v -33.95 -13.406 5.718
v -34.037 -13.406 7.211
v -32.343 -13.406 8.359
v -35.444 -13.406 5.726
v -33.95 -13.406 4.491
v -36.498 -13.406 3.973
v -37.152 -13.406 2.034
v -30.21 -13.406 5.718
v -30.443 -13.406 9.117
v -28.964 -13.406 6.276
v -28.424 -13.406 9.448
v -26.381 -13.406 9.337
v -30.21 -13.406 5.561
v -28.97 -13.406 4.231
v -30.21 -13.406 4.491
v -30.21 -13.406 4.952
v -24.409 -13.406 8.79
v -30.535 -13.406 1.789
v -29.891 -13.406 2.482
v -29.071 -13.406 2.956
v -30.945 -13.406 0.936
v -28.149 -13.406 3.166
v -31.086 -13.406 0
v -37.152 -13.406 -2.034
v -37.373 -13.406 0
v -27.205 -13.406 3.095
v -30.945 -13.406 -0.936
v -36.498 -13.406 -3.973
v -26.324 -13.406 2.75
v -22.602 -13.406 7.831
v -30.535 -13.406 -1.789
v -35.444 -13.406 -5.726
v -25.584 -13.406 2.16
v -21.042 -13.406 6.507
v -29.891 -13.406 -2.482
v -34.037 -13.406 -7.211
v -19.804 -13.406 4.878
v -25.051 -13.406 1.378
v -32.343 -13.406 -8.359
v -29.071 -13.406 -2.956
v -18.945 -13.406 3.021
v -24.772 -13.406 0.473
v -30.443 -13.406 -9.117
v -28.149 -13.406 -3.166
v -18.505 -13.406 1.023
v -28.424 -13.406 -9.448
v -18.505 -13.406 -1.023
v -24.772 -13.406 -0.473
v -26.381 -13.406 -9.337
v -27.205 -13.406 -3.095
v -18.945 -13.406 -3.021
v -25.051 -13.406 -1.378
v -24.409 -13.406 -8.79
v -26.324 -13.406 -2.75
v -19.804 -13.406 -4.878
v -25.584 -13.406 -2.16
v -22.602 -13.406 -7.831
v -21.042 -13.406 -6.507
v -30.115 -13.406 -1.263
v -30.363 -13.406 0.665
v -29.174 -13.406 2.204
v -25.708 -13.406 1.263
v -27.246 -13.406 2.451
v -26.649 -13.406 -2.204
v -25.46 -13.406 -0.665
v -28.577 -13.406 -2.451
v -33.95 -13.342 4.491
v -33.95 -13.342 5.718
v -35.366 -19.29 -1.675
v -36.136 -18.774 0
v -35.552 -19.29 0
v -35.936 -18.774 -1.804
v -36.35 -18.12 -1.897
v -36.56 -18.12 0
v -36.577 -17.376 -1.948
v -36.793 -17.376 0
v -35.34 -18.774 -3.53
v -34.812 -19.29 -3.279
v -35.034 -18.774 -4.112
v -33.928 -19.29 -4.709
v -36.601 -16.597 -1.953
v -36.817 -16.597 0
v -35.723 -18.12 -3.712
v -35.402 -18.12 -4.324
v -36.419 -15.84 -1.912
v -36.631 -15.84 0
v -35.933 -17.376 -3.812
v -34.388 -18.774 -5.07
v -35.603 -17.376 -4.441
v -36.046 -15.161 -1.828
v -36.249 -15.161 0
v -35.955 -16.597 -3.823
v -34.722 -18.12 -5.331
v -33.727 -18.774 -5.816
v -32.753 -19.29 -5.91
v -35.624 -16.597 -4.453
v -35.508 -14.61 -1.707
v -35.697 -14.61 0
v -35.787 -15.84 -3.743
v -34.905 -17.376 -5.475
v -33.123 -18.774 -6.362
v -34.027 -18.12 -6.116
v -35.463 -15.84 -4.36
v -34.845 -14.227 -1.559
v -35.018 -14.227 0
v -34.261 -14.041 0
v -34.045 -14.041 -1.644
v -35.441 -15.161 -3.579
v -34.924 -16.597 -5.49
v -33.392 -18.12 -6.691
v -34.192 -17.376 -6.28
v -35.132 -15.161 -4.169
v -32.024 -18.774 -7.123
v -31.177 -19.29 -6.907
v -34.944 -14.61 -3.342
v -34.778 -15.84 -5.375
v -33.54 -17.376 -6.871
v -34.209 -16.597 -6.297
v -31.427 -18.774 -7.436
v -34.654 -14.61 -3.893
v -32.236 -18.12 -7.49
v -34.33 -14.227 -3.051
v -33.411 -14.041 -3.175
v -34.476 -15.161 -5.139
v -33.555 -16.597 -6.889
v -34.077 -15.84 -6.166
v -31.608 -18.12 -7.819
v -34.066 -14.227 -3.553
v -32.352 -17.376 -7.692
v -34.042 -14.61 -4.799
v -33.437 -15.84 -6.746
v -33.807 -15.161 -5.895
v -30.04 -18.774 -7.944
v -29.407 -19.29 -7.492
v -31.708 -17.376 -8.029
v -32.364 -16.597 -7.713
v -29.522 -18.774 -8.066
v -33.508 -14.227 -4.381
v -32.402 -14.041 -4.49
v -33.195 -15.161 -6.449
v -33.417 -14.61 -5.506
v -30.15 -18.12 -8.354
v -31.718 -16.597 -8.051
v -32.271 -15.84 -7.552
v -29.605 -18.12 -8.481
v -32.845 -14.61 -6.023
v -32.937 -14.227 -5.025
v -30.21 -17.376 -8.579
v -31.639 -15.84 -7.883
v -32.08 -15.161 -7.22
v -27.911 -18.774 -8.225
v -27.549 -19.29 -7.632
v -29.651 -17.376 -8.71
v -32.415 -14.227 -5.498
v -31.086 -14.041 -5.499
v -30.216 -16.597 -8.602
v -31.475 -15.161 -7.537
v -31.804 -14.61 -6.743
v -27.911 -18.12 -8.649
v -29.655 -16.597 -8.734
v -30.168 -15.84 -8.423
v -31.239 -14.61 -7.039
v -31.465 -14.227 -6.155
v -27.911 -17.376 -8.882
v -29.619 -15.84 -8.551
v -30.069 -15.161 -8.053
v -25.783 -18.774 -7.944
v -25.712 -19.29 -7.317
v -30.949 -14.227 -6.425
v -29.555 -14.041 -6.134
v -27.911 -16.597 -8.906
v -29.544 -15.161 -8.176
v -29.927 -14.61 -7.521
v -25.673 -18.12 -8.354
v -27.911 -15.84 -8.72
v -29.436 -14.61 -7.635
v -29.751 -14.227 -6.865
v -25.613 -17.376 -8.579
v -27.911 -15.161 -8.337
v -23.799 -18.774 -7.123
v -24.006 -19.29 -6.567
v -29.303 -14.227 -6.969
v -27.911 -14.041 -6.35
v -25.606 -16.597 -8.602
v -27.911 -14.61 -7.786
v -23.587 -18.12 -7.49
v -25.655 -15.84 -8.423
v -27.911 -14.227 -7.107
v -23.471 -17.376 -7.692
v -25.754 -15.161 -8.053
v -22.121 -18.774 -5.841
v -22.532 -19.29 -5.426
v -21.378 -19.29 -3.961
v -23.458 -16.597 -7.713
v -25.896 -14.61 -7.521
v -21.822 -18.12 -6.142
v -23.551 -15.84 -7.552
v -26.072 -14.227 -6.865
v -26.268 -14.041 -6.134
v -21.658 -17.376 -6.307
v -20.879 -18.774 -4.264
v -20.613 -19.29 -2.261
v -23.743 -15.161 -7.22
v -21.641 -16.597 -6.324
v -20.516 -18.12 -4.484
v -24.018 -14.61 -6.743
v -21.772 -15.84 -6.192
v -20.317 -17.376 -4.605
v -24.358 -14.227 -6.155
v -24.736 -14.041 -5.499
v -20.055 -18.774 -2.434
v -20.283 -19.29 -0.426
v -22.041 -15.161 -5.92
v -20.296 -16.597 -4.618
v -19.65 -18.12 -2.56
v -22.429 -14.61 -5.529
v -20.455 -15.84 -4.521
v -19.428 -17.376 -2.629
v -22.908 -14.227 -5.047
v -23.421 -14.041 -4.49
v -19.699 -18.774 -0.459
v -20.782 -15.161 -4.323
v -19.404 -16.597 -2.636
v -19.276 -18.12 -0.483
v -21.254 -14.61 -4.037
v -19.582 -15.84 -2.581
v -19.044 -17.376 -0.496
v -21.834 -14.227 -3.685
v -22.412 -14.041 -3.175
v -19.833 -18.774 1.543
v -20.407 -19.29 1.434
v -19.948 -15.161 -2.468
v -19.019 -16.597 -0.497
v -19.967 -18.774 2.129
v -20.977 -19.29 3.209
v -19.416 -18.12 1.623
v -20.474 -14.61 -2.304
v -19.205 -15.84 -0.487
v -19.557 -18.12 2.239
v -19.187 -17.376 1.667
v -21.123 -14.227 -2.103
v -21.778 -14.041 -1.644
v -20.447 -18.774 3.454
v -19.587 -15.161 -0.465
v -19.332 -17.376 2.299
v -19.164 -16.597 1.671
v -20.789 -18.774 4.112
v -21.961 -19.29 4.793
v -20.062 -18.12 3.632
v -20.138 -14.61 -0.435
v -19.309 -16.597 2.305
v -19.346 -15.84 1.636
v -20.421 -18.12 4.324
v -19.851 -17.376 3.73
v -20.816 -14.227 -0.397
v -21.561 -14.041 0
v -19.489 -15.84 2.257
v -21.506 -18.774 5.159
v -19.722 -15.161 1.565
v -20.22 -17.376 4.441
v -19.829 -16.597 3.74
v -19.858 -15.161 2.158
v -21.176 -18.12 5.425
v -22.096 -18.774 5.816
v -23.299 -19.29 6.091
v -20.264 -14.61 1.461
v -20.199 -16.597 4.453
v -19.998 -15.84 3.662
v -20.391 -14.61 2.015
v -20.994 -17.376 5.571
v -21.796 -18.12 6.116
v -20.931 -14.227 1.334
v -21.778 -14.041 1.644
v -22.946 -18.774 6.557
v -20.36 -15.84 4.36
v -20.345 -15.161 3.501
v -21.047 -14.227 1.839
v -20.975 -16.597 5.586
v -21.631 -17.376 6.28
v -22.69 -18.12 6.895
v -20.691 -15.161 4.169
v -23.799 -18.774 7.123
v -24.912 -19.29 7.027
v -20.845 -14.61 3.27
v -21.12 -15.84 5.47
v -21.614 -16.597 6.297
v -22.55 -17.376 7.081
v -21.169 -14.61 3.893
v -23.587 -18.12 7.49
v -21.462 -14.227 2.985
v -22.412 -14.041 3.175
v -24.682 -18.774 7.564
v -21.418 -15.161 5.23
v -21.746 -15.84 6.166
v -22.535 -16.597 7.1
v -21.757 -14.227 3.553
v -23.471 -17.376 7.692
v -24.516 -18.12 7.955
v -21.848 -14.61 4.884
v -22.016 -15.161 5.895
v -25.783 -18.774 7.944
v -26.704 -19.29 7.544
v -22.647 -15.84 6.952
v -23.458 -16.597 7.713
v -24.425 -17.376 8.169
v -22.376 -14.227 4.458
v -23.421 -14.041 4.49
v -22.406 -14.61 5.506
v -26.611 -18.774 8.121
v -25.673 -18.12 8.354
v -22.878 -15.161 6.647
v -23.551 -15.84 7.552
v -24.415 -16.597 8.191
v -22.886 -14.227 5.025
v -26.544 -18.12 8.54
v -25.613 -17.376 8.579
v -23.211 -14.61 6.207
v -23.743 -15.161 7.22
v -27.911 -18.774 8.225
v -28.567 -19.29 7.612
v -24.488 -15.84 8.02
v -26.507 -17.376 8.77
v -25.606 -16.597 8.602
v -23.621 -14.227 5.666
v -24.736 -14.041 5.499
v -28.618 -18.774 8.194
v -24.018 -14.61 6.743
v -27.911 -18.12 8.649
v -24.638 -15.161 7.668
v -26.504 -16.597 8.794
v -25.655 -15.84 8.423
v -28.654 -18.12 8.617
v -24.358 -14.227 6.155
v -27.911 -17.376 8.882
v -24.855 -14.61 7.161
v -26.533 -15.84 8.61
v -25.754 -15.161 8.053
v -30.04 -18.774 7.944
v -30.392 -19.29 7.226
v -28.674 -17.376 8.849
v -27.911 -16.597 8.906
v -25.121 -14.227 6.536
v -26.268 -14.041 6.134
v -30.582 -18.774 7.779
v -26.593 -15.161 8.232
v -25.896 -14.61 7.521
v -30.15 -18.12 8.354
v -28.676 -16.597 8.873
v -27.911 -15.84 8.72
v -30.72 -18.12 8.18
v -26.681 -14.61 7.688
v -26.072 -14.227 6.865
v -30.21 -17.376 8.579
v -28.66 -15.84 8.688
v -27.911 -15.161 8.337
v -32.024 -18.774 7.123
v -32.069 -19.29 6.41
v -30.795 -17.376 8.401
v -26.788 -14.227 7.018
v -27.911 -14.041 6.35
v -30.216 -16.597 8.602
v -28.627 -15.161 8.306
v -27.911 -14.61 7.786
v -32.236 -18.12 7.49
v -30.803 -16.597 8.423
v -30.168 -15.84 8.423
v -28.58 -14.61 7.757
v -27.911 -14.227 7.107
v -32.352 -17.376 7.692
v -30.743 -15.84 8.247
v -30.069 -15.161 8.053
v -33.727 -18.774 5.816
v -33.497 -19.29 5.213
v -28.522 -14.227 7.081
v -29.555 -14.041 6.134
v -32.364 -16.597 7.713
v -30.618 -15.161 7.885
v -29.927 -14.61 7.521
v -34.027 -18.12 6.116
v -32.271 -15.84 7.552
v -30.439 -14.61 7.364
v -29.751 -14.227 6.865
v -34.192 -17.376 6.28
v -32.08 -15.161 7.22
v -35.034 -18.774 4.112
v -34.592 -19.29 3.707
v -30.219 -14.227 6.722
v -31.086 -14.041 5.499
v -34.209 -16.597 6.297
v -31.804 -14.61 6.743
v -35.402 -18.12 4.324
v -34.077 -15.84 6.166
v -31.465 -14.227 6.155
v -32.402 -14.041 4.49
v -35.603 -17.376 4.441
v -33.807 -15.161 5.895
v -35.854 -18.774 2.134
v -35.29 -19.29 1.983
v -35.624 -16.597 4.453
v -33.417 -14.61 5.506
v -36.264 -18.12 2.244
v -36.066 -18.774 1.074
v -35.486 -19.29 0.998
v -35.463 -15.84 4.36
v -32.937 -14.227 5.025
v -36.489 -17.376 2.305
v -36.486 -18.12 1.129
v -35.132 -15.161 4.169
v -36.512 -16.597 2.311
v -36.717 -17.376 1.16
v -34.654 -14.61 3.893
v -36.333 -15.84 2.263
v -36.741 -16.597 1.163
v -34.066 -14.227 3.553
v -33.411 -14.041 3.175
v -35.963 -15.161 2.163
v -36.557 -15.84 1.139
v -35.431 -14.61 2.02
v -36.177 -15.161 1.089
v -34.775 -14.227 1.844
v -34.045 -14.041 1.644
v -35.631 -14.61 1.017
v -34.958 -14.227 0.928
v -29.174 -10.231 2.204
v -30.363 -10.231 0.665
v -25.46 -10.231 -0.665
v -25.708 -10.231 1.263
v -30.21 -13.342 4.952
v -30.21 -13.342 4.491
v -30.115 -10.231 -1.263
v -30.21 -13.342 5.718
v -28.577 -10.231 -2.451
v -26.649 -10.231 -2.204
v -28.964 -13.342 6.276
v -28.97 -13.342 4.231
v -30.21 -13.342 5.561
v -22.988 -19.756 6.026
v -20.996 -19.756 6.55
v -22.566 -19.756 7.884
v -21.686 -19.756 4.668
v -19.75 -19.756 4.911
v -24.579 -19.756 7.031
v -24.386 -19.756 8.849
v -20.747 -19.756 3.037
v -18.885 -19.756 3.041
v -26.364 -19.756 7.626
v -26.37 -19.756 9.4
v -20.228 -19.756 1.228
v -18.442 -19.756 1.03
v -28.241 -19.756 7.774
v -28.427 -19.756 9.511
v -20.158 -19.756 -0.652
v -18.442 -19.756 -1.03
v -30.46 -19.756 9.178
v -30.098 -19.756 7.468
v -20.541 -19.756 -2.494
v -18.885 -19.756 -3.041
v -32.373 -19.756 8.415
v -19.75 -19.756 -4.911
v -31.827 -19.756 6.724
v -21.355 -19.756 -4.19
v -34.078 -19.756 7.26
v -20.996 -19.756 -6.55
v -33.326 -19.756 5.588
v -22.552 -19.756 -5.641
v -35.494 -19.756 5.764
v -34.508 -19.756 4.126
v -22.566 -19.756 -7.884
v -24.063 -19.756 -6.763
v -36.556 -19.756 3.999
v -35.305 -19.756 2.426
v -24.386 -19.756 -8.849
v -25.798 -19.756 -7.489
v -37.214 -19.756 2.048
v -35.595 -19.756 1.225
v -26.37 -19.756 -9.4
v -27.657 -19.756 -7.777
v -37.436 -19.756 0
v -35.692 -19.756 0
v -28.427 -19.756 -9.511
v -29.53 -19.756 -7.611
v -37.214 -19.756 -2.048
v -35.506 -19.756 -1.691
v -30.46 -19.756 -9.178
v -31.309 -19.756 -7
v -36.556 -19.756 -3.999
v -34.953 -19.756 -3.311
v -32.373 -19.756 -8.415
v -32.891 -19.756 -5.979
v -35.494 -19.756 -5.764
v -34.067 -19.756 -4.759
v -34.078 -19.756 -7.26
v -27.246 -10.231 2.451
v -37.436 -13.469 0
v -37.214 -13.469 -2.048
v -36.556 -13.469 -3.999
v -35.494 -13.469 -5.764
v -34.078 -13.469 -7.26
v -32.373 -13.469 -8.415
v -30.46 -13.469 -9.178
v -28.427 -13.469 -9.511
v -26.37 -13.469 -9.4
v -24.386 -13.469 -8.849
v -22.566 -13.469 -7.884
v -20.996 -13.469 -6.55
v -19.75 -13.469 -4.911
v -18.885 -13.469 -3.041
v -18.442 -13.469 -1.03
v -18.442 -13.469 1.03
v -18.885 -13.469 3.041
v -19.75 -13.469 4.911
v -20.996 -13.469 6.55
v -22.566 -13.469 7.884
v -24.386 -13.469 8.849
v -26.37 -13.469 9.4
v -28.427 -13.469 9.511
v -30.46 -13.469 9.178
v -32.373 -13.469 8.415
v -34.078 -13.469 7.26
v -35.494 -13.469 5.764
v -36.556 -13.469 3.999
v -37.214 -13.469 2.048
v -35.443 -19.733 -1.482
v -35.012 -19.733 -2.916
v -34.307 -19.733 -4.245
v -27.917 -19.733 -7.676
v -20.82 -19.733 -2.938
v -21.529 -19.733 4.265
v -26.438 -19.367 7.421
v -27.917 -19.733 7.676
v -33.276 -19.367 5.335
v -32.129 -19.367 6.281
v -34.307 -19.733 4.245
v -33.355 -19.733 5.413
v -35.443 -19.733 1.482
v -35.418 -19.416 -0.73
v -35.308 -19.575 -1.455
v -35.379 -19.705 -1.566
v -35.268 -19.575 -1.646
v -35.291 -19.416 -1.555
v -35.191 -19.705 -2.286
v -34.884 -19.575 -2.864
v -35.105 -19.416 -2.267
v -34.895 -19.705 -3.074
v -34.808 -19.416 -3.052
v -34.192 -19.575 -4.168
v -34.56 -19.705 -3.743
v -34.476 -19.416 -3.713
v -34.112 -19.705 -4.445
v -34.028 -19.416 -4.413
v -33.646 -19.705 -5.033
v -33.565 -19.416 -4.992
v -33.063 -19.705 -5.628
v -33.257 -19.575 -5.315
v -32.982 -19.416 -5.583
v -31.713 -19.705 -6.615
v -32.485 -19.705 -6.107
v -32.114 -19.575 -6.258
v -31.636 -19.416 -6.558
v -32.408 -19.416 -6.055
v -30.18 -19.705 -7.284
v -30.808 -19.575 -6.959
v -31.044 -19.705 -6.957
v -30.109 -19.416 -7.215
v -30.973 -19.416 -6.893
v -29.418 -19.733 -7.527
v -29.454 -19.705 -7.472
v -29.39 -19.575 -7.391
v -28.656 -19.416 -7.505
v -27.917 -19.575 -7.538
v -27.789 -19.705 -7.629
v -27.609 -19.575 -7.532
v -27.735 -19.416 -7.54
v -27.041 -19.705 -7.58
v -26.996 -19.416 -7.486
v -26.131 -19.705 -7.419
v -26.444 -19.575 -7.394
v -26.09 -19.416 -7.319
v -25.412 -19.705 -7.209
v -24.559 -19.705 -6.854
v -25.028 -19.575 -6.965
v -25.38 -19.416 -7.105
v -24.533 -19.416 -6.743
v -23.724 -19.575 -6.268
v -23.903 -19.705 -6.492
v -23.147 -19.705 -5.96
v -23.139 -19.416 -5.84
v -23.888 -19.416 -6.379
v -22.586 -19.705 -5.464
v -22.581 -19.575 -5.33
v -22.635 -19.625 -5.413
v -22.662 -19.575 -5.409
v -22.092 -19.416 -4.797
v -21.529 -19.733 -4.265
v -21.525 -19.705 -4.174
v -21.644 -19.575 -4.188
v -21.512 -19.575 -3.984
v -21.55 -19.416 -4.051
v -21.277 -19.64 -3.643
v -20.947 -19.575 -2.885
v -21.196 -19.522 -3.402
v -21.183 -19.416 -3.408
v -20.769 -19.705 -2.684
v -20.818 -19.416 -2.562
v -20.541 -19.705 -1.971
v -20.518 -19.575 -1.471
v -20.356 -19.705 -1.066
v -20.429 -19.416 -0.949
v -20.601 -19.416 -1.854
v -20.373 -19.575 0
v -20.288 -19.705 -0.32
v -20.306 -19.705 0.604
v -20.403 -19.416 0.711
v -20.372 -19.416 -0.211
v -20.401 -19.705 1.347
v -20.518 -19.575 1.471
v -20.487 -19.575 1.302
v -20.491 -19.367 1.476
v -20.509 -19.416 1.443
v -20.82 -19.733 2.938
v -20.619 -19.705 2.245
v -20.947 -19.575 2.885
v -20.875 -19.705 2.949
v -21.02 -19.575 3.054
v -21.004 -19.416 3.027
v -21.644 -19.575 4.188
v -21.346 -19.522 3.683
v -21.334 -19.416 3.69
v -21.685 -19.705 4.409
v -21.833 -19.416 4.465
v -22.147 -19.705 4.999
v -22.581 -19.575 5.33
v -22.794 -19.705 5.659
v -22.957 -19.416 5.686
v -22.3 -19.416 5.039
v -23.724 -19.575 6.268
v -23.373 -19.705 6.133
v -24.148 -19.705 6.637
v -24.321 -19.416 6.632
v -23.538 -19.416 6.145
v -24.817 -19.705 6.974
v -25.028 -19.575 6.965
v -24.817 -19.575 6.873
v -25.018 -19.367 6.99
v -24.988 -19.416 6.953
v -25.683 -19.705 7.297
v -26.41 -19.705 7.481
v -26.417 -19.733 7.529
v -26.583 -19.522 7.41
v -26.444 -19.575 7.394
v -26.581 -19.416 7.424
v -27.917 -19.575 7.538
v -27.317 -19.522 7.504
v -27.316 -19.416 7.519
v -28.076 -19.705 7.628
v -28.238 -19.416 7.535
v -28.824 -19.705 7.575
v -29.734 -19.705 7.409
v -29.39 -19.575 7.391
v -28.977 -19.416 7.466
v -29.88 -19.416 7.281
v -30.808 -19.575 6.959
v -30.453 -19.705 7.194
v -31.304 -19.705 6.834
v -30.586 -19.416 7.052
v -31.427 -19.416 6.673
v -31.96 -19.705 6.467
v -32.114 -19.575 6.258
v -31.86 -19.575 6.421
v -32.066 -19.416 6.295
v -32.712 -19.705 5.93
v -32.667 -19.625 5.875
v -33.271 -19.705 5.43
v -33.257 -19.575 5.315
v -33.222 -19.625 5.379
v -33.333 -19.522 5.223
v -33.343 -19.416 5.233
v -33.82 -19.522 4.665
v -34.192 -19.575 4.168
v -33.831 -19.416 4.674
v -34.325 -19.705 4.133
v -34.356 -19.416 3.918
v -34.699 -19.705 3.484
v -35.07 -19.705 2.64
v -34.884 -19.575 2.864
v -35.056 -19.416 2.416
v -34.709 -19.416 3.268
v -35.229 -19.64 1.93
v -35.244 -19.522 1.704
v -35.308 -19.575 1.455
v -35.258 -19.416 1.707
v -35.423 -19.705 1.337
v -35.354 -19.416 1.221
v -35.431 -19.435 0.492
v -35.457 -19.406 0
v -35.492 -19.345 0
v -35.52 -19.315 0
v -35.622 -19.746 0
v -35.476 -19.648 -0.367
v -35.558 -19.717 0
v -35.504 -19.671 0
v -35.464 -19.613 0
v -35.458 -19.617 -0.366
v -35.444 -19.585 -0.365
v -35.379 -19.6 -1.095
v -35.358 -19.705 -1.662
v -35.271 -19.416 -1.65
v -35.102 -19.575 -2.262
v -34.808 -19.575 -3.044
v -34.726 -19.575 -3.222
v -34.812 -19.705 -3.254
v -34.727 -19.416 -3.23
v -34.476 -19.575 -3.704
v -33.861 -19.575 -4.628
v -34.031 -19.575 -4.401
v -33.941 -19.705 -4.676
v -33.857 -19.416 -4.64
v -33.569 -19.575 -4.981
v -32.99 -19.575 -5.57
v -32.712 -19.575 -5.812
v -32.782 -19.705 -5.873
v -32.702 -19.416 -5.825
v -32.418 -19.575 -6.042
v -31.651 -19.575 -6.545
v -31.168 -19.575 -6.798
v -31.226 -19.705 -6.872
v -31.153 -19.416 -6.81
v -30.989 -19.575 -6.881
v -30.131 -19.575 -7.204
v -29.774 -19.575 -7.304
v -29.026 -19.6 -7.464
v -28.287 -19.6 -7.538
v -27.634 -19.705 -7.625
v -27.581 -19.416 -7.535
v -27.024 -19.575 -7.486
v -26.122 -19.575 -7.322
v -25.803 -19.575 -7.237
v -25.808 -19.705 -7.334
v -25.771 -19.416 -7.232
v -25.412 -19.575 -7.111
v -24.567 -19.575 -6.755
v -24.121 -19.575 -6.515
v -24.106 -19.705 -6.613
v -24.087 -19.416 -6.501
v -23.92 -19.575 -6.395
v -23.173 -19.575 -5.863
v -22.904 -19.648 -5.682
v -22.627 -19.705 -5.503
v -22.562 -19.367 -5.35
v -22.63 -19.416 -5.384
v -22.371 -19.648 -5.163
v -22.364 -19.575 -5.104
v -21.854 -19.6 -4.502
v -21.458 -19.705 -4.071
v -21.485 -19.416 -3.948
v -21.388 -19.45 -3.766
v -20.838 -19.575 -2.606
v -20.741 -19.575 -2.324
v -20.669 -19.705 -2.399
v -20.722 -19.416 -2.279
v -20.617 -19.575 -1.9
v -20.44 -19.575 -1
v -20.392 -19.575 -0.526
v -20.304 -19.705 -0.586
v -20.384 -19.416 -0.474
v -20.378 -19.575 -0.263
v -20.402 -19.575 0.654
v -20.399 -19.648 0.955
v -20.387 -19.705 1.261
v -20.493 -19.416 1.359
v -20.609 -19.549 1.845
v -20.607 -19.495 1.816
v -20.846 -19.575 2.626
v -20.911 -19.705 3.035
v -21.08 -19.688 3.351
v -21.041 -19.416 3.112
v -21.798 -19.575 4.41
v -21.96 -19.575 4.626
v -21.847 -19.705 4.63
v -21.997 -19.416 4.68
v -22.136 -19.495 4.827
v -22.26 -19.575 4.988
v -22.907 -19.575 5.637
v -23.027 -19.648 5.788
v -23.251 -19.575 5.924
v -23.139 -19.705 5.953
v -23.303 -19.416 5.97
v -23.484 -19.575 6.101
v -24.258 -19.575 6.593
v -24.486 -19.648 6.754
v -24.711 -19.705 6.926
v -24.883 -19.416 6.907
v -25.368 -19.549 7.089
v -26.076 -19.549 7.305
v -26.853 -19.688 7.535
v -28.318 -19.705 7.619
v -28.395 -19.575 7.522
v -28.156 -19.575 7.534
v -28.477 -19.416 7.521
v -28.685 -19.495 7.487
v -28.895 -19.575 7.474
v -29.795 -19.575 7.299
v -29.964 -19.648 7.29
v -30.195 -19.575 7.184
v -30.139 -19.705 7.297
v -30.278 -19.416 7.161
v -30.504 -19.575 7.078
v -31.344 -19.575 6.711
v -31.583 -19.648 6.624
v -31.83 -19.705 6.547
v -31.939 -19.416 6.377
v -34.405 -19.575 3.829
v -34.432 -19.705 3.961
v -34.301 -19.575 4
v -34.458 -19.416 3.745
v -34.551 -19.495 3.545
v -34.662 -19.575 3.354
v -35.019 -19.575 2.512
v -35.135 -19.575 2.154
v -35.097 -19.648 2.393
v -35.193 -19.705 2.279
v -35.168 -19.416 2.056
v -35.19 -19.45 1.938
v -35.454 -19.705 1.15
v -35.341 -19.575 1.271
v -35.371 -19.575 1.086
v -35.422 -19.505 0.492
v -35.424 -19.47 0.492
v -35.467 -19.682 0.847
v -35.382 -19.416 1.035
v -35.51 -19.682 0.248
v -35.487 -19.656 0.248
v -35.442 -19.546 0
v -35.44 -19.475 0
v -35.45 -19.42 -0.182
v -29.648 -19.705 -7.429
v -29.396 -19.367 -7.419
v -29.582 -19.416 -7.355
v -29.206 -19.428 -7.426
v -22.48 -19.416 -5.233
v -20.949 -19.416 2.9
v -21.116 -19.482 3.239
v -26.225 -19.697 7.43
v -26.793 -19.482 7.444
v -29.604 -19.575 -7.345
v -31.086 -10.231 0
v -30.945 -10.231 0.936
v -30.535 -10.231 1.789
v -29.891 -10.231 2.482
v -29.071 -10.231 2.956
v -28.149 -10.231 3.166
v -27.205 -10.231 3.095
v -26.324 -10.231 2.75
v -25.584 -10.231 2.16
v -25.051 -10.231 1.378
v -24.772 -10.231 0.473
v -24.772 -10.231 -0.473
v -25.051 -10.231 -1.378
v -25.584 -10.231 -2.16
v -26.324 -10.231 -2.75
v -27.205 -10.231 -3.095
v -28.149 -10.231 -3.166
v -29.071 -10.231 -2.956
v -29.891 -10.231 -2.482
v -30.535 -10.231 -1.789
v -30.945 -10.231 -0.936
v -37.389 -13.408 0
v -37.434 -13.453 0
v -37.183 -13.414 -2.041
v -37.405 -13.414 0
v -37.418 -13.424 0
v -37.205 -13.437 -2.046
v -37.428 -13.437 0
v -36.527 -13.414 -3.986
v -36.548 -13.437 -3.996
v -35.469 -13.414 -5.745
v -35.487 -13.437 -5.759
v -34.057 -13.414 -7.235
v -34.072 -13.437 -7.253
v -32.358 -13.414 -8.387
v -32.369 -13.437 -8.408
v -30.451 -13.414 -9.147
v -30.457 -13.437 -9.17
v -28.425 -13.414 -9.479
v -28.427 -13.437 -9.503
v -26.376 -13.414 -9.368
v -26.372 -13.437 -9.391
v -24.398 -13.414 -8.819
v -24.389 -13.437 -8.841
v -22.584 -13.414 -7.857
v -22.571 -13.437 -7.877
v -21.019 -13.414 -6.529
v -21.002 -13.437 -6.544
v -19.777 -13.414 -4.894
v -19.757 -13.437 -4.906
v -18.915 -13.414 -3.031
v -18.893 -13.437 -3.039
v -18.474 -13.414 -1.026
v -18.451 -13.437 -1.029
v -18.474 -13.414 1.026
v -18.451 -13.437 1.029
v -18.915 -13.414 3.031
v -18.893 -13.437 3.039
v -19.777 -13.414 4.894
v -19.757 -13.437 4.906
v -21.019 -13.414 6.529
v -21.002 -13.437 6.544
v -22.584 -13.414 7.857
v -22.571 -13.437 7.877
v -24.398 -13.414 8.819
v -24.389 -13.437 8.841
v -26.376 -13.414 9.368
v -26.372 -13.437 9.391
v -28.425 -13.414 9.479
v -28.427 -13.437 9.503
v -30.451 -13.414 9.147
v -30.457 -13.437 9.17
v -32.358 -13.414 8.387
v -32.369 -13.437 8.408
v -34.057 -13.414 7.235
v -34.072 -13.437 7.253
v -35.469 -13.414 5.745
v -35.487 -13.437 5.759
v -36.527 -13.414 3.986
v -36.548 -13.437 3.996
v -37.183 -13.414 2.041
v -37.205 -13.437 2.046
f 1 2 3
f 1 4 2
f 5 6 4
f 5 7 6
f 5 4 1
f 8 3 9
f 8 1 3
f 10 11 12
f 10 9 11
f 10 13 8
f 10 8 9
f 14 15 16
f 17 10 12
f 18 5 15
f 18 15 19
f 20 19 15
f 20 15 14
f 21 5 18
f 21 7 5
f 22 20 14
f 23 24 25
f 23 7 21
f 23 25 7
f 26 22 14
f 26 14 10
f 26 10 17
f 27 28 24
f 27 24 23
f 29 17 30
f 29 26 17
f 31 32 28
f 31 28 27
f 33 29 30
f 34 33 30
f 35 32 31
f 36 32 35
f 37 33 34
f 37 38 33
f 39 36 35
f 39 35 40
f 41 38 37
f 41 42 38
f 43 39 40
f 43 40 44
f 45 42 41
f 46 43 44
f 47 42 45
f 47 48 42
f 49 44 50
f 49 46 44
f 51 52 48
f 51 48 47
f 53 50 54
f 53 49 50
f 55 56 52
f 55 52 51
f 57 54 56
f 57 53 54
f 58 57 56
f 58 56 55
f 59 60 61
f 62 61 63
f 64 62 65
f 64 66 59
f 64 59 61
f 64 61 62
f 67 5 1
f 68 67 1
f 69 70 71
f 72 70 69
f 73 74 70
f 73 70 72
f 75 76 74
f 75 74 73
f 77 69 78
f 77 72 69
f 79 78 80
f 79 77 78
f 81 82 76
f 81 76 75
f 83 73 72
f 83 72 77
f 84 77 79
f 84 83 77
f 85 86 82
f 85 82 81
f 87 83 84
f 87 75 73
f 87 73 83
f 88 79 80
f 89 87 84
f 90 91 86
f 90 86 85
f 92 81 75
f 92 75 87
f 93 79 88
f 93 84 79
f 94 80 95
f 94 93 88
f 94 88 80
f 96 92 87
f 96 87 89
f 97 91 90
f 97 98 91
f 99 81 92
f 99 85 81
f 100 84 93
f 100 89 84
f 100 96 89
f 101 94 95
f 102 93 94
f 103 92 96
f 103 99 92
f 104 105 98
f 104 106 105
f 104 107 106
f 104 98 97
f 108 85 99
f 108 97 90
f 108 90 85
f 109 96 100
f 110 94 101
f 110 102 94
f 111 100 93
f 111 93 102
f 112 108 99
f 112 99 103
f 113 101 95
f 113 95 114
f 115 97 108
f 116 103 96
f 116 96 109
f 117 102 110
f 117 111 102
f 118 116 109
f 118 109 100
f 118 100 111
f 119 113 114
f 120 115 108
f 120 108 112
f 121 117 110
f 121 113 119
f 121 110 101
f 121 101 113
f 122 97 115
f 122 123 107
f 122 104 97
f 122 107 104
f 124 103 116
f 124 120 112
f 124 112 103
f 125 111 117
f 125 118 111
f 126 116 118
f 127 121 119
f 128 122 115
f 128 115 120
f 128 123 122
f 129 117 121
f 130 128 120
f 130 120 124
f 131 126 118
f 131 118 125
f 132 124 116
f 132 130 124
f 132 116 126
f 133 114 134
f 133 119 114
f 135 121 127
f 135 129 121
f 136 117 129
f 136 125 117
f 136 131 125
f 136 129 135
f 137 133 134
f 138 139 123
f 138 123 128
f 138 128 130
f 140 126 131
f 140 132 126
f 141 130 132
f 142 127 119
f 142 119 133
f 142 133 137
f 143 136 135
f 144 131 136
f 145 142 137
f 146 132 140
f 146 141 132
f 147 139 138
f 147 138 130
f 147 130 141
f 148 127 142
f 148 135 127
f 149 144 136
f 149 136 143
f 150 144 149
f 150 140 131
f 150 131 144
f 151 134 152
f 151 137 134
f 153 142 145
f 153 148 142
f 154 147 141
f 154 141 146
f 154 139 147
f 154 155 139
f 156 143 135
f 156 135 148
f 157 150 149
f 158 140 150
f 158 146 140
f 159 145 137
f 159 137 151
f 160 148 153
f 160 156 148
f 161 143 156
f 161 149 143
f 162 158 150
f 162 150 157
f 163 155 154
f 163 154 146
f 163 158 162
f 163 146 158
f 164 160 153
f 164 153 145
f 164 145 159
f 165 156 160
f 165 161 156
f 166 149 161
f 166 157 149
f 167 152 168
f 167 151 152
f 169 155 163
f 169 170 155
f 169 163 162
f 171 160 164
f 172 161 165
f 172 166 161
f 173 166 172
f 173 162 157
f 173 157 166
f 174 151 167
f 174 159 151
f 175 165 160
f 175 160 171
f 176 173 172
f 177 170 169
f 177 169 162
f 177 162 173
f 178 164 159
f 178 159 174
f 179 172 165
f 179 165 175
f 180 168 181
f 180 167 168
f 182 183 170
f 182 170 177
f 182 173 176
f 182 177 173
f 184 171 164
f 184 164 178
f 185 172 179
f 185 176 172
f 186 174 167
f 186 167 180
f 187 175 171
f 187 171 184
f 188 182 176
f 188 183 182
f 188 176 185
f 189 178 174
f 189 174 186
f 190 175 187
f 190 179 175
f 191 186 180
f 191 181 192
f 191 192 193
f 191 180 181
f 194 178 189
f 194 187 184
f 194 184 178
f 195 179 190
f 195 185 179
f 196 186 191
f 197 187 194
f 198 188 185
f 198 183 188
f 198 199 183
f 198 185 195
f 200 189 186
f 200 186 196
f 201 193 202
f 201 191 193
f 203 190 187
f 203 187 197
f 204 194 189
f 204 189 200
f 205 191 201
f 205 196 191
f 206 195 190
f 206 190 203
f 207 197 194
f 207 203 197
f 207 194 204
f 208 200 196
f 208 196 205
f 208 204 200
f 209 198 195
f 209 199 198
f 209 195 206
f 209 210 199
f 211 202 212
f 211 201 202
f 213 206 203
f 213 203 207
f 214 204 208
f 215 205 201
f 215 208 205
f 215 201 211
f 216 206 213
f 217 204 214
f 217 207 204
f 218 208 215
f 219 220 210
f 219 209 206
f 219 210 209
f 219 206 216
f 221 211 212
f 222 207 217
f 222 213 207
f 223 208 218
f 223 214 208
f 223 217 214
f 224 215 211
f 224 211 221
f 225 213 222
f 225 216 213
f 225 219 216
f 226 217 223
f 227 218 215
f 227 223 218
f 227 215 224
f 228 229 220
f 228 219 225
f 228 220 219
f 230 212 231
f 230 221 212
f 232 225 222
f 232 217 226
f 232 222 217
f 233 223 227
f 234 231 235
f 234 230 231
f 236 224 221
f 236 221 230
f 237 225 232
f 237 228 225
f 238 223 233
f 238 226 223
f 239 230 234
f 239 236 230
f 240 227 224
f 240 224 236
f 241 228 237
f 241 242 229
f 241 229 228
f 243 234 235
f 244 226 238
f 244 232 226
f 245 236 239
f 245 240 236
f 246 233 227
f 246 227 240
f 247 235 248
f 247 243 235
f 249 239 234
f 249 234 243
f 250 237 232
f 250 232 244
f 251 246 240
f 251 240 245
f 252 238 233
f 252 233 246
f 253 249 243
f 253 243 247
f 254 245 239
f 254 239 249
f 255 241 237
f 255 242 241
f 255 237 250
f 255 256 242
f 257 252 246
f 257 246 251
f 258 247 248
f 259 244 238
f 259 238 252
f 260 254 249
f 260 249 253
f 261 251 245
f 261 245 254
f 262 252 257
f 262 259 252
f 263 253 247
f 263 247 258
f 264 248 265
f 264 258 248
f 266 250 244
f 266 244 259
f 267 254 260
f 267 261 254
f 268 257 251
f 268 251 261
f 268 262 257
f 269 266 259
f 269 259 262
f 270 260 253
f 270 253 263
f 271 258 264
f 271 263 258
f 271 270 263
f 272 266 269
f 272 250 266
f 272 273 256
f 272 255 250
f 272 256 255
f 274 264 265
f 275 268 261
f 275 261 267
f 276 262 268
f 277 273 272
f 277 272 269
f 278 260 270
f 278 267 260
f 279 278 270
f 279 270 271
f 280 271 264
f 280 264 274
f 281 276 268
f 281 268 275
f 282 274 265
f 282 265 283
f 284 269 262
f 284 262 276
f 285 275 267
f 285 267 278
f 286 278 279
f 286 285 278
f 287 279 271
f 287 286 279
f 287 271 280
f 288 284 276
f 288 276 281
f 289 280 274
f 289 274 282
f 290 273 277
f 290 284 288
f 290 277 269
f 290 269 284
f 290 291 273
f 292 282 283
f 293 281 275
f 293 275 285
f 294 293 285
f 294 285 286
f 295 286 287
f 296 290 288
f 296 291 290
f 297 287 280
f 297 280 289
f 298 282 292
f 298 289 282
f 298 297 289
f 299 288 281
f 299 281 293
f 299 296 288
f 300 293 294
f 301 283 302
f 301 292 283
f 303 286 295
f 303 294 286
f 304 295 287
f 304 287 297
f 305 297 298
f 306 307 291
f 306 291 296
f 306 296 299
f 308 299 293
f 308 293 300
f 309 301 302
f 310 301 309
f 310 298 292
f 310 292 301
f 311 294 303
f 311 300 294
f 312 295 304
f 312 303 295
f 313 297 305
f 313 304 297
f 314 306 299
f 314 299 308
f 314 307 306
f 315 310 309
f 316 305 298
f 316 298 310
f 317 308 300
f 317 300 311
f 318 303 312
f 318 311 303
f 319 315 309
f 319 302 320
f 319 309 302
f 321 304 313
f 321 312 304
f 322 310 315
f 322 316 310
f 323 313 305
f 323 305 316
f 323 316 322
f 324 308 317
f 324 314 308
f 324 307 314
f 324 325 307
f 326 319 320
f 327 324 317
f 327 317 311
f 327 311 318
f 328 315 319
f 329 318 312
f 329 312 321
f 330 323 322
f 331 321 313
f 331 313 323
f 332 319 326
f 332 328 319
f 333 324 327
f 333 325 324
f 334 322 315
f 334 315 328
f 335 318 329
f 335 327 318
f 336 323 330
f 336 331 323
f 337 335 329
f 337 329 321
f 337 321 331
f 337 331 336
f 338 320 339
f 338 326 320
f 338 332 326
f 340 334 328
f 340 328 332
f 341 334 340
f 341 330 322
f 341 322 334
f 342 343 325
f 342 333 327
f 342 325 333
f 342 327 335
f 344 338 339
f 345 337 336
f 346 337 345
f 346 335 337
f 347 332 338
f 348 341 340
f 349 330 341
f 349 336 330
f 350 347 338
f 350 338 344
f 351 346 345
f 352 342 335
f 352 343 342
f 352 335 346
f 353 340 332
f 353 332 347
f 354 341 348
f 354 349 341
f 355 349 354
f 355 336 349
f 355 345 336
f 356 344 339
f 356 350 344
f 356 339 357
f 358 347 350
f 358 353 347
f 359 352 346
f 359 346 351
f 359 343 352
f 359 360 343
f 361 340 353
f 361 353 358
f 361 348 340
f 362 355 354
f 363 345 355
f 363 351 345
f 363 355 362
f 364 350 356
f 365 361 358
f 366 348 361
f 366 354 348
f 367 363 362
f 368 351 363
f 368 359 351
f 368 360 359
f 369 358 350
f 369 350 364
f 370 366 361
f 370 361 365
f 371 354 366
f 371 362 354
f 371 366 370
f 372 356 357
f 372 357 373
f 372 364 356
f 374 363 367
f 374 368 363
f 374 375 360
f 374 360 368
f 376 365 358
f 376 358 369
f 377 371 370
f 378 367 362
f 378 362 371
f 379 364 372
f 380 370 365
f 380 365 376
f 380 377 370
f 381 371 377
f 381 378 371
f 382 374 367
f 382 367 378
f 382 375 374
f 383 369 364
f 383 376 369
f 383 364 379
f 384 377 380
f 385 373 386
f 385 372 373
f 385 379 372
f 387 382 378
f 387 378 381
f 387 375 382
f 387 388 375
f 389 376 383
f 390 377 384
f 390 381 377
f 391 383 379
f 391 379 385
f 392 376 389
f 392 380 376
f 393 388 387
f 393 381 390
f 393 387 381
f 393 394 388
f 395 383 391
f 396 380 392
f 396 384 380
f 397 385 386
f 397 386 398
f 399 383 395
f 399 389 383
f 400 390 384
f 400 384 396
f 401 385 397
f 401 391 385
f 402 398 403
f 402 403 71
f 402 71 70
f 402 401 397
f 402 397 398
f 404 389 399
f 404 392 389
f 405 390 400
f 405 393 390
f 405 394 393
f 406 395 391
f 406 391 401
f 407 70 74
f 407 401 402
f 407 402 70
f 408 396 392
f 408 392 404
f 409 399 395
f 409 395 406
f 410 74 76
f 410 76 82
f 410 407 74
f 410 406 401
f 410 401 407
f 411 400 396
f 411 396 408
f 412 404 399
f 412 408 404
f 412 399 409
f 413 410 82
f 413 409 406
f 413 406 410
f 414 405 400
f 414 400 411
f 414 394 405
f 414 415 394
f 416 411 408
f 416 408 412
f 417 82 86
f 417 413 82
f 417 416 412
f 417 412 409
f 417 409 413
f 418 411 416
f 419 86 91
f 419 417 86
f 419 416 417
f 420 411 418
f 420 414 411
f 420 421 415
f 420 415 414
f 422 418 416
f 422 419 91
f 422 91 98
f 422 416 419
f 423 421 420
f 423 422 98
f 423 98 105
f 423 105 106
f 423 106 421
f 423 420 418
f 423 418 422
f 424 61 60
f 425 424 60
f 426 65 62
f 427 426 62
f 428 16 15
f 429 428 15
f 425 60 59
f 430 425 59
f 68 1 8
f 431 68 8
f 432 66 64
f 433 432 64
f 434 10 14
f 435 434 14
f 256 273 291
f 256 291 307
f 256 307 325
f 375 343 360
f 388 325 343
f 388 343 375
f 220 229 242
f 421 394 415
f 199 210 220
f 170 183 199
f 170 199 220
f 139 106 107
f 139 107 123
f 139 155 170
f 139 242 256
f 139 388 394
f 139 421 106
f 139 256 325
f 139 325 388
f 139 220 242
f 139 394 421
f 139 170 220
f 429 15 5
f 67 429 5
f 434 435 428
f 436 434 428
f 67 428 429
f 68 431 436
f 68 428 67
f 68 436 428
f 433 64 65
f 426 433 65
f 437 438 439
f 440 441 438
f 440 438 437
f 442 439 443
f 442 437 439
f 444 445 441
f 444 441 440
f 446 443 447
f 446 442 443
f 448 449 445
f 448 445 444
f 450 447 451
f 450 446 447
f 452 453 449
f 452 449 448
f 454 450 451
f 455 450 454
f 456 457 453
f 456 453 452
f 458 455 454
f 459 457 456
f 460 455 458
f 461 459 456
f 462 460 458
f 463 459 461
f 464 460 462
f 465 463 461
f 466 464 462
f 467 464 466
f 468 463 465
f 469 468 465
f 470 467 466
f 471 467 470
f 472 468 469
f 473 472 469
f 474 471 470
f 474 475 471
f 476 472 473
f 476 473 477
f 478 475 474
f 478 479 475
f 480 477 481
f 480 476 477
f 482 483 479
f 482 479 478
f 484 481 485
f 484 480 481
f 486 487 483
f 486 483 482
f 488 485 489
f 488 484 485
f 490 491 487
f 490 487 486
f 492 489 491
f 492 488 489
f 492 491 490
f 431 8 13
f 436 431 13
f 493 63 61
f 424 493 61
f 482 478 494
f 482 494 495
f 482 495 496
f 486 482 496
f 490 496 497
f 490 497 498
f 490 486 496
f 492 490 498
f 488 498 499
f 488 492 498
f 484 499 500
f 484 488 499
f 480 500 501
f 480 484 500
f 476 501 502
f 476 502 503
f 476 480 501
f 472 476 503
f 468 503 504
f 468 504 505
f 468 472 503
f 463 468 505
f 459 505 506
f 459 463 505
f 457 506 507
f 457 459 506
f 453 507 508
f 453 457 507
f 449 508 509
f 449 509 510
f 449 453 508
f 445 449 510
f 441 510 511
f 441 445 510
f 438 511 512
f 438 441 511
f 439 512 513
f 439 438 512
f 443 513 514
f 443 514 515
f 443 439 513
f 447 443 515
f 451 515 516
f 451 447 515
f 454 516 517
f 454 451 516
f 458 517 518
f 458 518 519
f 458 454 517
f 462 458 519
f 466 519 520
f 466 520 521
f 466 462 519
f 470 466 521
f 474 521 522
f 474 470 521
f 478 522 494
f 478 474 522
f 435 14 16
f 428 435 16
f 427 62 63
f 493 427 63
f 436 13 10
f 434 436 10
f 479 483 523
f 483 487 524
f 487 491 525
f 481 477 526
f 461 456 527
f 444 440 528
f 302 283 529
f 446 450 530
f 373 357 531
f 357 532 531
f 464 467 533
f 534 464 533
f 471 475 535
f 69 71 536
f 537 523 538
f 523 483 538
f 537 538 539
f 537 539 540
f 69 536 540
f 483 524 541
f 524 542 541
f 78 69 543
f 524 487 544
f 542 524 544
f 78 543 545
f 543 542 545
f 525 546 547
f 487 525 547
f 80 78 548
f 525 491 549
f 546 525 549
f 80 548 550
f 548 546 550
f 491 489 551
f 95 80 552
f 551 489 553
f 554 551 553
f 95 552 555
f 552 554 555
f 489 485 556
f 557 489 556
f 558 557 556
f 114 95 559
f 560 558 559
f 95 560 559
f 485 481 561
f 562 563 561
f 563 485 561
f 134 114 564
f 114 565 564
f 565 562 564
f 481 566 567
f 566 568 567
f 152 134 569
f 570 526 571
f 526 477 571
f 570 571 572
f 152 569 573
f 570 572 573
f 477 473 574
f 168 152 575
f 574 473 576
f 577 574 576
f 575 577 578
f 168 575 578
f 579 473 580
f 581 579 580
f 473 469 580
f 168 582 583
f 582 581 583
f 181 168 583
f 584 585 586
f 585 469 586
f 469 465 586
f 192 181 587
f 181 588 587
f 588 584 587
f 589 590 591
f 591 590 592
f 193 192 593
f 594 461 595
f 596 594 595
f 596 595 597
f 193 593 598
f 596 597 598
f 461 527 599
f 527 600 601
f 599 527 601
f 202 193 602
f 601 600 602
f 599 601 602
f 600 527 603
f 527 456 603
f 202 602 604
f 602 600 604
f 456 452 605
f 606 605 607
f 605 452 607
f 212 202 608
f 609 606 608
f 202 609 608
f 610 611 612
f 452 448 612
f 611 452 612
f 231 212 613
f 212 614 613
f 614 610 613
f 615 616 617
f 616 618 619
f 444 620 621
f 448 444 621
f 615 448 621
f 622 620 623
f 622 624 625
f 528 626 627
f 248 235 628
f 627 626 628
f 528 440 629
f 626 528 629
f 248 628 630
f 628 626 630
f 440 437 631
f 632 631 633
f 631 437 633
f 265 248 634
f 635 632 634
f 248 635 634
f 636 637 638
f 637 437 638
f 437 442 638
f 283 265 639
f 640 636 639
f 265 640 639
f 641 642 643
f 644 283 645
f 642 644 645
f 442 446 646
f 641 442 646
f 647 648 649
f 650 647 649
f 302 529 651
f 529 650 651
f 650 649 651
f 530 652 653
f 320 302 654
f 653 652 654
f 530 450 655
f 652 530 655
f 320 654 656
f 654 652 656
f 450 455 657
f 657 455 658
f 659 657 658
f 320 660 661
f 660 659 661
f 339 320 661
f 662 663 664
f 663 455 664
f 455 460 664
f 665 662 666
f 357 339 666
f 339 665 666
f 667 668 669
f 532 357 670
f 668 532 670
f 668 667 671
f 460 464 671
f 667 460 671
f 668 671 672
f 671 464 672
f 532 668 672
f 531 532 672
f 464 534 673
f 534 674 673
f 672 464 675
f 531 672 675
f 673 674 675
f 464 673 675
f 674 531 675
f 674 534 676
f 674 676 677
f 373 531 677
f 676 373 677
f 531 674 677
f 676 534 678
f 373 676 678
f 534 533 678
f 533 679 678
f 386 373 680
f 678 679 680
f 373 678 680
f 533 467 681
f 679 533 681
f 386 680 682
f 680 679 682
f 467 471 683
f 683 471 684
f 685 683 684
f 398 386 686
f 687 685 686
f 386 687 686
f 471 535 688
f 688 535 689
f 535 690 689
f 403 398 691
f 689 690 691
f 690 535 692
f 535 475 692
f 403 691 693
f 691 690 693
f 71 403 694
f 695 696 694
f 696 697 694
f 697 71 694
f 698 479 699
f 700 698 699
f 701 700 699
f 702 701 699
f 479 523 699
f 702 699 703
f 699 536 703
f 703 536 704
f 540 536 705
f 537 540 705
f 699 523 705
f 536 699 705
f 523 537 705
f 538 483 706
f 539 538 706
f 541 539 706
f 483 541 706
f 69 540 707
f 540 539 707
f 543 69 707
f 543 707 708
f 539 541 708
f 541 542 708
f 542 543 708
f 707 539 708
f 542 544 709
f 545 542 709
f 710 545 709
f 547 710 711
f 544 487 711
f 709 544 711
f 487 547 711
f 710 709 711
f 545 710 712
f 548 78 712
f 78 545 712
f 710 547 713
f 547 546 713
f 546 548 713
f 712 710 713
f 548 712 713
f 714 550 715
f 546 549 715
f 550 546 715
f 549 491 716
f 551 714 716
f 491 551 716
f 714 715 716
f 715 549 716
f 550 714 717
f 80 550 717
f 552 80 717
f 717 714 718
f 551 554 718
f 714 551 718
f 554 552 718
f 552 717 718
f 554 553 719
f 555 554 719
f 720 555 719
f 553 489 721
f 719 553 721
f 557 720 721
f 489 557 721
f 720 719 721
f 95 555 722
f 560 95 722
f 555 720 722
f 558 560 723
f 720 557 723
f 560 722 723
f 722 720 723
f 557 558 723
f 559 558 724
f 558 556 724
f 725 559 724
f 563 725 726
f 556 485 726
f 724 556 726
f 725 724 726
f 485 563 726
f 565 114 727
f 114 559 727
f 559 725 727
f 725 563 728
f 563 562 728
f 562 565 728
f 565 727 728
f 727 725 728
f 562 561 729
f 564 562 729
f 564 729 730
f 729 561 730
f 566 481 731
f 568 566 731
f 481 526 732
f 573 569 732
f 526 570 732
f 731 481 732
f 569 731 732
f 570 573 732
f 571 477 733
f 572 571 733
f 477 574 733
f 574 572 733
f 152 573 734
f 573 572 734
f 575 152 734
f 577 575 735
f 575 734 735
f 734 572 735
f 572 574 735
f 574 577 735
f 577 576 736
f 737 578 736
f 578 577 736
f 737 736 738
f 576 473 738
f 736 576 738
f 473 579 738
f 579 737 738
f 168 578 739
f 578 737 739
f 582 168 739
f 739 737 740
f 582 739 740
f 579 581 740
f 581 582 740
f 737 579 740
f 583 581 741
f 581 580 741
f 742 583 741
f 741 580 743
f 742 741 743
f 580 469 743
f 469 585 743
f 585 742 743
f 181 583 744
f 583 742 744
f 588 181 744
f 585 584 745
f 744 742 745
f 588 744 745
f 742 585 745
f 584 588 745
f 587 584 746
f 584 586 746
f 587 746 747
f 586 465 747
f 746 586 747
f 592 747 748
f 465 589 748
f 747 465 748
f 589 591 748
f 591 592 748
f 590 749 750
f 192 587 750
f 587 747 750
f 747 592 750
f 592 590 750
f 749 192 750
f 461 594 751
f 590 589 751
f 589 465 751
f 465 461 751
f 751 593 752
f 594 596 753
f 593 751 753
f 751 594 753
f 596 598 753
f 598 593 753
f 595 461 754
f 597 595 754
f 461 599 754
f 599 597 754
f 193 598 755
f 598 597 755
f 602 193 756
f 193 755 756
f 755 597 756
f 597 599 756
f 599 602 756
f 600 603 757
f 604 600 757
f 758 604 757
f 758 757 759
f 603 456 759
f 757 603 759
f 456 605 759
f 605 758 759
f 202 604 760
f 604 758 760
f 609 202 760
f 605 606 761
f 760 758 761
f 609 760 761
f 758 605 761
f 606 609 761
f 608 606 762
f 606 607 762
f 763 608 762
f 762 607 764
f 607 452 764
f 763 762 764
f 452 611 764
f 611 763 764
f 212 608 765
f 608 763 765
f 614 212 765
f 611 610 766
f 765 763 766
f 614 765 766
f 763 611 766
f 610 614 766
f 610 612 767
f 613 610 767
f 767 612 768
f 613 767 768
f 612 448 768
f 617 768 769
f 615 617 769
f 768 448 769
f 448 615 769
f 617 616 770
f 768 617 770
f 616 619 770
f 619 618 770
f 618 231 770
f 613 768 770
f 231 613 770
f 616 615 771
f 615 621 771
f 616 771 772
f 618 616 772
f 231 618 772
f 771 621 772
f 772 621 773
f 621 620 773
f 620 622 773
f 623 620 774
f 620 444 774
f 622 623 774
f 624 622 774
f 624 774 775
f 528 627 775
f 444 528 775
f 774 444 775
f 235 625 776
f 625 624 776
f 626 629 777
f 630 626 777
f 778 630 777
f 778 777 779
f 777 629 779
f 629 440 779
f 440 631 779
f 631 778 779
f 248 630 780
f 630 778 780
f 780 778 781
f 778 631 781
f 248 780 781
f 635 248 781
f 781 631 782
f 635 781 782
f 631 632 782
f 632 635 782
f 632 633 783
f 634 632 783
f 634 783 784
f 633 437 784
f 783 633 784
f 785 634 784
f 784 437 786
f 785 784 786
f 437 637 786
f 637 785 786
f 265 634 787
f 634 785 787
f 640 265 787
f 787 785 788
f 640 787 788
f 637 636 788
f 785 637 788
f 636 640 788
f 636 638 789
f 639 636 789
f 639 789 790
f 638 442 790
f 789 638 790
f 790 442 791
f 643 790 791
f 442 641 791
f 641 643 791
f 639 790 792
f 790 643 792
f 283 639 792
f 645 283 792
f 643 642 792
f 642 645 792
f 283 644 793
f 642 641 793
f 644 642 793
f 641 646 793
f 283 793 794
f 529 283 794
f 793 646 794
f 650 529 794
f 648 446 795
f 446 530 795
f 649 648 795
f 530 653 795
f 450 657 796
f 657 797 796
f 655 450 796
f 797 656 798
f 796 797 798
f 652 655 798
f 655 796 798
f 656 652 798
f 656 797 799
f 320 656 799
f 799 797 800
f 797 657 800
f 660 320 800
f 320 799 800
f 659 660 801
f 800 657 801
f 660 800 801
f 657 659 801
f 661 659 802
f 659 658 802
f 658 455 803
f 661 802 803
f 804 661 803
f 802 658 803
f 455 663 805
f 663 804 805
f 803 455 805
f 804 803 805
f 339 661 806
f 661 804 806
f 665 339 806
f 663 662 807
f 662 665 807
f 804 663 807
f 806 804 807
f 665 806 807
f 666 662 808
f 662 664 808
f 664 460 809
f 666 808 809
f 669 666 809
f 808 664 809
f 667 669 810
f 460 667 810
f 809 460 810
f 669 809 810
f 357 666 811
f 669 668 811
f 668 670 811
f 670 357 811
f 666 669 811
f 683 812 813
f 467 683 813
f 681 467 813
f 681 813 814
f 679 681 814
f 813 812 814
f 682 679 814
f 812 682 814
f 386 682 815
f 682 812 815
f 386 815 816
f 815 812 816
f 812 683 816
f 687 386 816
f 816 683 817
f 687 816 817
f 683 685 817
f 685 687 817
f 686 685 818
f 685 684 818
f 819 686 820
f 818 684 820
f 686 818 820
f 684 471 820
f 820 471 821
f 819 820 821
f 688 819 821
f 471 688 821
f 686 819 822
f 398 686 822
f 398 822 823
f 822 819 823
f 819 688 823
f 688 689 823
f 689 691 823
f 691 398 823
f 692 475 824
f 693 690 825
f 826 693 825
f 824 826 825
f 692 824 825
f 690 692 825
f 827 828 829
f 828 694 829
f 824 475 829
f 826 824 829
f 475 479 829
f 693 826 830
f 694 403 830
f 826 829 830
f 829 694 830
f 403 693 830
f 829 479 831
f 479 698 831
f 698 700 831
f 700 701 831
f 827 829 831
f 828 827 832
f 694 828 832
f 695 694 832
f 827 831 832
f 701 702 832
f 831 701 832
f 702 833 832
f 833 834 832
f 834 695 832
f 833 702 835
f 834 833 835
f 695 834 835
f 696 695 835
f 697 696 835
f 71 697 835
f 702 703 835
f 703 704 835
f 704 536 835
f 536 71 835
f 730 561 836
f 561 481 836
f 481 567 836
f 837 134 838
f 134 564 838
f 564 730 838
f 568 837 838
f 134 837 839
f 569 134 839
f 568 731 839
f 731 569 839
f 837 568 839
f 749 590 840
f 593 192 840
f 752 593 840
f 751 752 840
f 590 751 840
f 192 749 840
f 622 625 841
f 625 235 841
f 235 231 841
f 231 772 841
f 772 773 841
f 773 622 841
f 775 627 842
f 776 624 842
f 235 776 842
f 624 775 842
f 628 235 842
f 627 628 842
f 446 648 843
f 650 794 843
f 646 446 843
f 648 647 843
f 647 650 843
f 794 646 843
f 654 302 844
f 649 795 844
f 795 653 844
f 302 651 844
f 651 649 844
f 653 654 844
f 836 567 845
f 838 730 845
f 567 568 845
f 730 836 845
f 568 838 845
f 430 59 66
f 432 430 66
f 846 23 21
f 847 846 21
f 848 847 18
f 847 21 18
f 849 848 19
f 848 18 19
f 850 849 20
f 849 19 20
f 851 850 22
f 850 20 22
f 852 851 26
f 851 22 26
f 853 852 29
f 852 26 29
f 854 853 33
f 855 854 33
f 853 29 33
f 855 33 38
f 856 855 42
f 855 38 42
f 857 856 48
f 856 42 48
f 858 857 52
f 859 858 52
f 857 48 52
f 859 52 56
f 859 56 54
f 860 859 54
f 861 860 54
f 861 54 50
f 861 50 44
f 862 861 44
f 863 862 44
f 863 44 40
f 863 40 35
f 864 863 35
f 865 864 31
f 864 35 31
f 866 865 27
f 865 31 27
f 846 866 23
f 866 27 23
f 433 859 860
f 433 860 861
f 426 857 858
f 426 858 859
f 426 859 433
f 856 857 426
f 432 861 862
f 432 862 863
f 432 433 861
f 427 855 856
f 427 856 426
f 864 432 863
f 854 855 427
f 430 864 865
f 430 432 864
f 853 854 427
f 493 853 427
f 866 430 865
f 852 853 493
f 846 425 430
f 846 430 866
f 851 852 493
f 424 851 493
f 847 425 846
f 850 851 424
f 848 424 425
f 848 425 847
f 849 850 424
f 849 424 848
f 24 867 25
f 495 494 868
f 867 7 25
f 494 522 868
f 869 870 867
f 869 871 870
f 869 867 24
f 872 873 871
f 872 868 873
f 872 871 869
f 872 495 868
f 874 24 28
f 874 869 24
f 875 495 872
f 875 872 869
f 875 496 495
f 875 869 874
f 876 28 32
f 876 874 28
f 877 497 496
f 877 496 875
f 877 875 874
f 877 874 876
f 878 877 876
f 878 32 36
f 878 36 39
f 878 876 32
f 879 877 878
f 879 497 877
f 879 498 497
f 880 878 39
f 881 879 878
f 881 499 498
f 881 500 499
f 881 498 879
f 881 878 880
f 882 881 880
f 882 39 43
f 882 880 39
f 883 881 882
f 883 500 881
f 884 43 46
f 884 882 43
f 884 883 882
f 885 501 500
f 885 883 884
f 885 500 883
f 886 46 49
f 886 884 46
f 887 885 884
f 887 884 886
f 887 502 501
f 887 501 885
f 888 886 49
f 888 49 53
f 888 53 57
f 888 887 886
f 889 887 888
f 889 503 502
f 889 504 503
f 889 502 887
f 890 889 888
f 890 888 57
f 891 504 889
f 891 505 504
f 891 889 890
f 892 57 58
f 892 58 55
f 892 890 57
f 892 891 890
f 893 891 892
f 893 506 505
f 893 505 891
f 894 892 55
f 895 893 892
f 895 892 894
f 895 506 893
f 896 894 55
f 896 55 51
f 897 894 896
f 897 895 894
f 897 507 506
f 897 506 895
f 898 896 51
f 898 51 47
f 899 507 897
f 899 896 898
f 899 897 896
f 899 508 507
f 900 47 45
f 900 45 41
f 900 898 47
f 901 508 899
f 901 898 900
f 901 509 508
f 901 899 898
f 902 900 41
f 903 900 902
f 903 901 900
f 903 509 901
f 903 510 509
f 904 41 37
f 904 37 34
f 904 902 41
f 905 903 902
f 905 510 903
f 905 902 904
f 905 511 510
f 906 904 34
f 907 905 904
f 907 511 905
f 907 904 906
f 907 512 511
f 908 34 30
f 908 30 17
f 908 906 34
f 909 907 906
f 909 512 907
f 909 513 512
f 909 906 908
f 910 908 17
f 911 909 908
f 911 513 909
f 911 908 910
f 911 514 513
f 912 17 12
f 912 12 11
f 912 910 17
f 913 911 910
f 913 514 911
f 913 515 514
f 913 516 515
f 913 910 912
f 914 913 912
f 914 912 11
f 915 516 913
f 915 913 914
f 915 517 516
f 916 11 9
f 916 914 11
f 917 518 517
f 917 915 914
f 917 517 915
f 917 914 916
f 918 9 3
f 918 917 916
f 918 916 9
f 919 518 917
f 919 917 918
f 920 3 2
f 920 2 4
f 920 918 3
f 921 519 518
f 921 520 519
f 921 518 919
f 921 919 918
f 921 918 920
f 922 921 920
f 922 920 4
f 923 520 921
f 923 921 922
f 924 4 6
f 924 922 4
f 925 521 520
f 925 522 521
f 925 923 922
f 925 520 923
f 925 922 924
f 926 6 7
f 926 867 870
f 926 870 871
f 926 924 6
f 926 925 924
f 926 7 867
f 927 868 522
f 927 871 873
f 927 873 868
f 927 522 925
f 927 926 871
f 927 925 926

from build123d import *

# Parameters (mm, degrees)
F2_R     = 3.175
F3_DEPTH = 3.175
F4_R     = 0.0635
F5_R     = 0.254
F7_DEPTH = 0.0635


with BuildPart() as f1:
    # F0 (on Top) → F1 (revolve)
    with BuildSketch(Plane.XY):
        with BuildLine():
            Line((-27.9113905668, -13.4055339169), (-37.4363905668, -13.4055339169))
            Line((-37.4363905668, -13.4055339169), (-37.4363905668, -19.7555339169))
            Line((-37.4363905668, -19.7555339169), (-34.2613905668, -19.7555339169))
            ThreePointArc((-34.2613905668, -19.7555339169), (-36.8331405668, -16.8980339169), (-34.2613905668, -14.0405339169))
            Line((-34.2613905668, -14.0405339169), (-27.9113905668, -14.0405339169))
            Line((-27.9113905668, -14.0405339169), (-27.9113905668, -13.4055339169))
        make_face()
    revolve(axis=Axis((-27.9113905668, -16.5805339169, 0), (0, -1, 0)))

    # F2 (on face) → F3 (join)
    with BuildSketch(Plane(origin=(0, -13.4055339169, 0), x_dir=(-1, 0, 0), z_dir=(0, 1, 0))):
        with Locations((27.9113905668, 0)):
            Circle(F2_R)
        Polygon((30.1152475484, -1.2627804262), (28.5768321807, -2.451282819), (26.6486101406, -2.2038569815), (25.4601077479, -0.6654416139), (25.7075335853, 1.2627804262), (27.245948953, 2.451282819), (29.1741709931, 2.2038569815), (30.3626733858, 0.6654416139), align=None, mode=Mode.SUBTRACT)
    extrude(amount=F3_DEPTH)

    # F4
    f4_edges = [f1.edges().sort_by_distance(p)[0] for p in [
        (-18.386391, -13.405534, 0),
    ]]
    fillet(f4_edges, radius=F4_R)

    # F5
    f5_edges = [f1.edges().sort_by_distance(p)[0] for p in [
        (-21.561391, -19.755534, 0),
    ]]
    fillet(f5_edges, radius=F5_R)

    # F6 (on face) → F7 (join)
    with BuildSketch(Plane(origin=(0, -13.4055339169, 0), x_dir=(-1, 0, 0), z_dir=(0, 1, 0))):
        Polygon((30.2102901042, 4.4913082384), (33.9498221874, 4.4913082384), (33.9498221874, 5.7183979079), (30.2102901042, 5.7183979079), (30.2102901042, 5.5610182325), (30.7377161321, 5.2586852067), (30.2102901042, 4.9519913076), align=None)
        Polygon((30.2102901042, 5.5610182325), (30.2102901042, 4.9519913076), (30.7377161321, 5.2586852067), align=None)
        Polygon((28.9700869471, 4.2308233678), (30.2102901042, 4.9519913076), (30.2102901042, 5.5610182325), (28.9637470755, 6.275566066), align=None)
    extrude(amount=F7_DEPTH)


solid = f1.part
